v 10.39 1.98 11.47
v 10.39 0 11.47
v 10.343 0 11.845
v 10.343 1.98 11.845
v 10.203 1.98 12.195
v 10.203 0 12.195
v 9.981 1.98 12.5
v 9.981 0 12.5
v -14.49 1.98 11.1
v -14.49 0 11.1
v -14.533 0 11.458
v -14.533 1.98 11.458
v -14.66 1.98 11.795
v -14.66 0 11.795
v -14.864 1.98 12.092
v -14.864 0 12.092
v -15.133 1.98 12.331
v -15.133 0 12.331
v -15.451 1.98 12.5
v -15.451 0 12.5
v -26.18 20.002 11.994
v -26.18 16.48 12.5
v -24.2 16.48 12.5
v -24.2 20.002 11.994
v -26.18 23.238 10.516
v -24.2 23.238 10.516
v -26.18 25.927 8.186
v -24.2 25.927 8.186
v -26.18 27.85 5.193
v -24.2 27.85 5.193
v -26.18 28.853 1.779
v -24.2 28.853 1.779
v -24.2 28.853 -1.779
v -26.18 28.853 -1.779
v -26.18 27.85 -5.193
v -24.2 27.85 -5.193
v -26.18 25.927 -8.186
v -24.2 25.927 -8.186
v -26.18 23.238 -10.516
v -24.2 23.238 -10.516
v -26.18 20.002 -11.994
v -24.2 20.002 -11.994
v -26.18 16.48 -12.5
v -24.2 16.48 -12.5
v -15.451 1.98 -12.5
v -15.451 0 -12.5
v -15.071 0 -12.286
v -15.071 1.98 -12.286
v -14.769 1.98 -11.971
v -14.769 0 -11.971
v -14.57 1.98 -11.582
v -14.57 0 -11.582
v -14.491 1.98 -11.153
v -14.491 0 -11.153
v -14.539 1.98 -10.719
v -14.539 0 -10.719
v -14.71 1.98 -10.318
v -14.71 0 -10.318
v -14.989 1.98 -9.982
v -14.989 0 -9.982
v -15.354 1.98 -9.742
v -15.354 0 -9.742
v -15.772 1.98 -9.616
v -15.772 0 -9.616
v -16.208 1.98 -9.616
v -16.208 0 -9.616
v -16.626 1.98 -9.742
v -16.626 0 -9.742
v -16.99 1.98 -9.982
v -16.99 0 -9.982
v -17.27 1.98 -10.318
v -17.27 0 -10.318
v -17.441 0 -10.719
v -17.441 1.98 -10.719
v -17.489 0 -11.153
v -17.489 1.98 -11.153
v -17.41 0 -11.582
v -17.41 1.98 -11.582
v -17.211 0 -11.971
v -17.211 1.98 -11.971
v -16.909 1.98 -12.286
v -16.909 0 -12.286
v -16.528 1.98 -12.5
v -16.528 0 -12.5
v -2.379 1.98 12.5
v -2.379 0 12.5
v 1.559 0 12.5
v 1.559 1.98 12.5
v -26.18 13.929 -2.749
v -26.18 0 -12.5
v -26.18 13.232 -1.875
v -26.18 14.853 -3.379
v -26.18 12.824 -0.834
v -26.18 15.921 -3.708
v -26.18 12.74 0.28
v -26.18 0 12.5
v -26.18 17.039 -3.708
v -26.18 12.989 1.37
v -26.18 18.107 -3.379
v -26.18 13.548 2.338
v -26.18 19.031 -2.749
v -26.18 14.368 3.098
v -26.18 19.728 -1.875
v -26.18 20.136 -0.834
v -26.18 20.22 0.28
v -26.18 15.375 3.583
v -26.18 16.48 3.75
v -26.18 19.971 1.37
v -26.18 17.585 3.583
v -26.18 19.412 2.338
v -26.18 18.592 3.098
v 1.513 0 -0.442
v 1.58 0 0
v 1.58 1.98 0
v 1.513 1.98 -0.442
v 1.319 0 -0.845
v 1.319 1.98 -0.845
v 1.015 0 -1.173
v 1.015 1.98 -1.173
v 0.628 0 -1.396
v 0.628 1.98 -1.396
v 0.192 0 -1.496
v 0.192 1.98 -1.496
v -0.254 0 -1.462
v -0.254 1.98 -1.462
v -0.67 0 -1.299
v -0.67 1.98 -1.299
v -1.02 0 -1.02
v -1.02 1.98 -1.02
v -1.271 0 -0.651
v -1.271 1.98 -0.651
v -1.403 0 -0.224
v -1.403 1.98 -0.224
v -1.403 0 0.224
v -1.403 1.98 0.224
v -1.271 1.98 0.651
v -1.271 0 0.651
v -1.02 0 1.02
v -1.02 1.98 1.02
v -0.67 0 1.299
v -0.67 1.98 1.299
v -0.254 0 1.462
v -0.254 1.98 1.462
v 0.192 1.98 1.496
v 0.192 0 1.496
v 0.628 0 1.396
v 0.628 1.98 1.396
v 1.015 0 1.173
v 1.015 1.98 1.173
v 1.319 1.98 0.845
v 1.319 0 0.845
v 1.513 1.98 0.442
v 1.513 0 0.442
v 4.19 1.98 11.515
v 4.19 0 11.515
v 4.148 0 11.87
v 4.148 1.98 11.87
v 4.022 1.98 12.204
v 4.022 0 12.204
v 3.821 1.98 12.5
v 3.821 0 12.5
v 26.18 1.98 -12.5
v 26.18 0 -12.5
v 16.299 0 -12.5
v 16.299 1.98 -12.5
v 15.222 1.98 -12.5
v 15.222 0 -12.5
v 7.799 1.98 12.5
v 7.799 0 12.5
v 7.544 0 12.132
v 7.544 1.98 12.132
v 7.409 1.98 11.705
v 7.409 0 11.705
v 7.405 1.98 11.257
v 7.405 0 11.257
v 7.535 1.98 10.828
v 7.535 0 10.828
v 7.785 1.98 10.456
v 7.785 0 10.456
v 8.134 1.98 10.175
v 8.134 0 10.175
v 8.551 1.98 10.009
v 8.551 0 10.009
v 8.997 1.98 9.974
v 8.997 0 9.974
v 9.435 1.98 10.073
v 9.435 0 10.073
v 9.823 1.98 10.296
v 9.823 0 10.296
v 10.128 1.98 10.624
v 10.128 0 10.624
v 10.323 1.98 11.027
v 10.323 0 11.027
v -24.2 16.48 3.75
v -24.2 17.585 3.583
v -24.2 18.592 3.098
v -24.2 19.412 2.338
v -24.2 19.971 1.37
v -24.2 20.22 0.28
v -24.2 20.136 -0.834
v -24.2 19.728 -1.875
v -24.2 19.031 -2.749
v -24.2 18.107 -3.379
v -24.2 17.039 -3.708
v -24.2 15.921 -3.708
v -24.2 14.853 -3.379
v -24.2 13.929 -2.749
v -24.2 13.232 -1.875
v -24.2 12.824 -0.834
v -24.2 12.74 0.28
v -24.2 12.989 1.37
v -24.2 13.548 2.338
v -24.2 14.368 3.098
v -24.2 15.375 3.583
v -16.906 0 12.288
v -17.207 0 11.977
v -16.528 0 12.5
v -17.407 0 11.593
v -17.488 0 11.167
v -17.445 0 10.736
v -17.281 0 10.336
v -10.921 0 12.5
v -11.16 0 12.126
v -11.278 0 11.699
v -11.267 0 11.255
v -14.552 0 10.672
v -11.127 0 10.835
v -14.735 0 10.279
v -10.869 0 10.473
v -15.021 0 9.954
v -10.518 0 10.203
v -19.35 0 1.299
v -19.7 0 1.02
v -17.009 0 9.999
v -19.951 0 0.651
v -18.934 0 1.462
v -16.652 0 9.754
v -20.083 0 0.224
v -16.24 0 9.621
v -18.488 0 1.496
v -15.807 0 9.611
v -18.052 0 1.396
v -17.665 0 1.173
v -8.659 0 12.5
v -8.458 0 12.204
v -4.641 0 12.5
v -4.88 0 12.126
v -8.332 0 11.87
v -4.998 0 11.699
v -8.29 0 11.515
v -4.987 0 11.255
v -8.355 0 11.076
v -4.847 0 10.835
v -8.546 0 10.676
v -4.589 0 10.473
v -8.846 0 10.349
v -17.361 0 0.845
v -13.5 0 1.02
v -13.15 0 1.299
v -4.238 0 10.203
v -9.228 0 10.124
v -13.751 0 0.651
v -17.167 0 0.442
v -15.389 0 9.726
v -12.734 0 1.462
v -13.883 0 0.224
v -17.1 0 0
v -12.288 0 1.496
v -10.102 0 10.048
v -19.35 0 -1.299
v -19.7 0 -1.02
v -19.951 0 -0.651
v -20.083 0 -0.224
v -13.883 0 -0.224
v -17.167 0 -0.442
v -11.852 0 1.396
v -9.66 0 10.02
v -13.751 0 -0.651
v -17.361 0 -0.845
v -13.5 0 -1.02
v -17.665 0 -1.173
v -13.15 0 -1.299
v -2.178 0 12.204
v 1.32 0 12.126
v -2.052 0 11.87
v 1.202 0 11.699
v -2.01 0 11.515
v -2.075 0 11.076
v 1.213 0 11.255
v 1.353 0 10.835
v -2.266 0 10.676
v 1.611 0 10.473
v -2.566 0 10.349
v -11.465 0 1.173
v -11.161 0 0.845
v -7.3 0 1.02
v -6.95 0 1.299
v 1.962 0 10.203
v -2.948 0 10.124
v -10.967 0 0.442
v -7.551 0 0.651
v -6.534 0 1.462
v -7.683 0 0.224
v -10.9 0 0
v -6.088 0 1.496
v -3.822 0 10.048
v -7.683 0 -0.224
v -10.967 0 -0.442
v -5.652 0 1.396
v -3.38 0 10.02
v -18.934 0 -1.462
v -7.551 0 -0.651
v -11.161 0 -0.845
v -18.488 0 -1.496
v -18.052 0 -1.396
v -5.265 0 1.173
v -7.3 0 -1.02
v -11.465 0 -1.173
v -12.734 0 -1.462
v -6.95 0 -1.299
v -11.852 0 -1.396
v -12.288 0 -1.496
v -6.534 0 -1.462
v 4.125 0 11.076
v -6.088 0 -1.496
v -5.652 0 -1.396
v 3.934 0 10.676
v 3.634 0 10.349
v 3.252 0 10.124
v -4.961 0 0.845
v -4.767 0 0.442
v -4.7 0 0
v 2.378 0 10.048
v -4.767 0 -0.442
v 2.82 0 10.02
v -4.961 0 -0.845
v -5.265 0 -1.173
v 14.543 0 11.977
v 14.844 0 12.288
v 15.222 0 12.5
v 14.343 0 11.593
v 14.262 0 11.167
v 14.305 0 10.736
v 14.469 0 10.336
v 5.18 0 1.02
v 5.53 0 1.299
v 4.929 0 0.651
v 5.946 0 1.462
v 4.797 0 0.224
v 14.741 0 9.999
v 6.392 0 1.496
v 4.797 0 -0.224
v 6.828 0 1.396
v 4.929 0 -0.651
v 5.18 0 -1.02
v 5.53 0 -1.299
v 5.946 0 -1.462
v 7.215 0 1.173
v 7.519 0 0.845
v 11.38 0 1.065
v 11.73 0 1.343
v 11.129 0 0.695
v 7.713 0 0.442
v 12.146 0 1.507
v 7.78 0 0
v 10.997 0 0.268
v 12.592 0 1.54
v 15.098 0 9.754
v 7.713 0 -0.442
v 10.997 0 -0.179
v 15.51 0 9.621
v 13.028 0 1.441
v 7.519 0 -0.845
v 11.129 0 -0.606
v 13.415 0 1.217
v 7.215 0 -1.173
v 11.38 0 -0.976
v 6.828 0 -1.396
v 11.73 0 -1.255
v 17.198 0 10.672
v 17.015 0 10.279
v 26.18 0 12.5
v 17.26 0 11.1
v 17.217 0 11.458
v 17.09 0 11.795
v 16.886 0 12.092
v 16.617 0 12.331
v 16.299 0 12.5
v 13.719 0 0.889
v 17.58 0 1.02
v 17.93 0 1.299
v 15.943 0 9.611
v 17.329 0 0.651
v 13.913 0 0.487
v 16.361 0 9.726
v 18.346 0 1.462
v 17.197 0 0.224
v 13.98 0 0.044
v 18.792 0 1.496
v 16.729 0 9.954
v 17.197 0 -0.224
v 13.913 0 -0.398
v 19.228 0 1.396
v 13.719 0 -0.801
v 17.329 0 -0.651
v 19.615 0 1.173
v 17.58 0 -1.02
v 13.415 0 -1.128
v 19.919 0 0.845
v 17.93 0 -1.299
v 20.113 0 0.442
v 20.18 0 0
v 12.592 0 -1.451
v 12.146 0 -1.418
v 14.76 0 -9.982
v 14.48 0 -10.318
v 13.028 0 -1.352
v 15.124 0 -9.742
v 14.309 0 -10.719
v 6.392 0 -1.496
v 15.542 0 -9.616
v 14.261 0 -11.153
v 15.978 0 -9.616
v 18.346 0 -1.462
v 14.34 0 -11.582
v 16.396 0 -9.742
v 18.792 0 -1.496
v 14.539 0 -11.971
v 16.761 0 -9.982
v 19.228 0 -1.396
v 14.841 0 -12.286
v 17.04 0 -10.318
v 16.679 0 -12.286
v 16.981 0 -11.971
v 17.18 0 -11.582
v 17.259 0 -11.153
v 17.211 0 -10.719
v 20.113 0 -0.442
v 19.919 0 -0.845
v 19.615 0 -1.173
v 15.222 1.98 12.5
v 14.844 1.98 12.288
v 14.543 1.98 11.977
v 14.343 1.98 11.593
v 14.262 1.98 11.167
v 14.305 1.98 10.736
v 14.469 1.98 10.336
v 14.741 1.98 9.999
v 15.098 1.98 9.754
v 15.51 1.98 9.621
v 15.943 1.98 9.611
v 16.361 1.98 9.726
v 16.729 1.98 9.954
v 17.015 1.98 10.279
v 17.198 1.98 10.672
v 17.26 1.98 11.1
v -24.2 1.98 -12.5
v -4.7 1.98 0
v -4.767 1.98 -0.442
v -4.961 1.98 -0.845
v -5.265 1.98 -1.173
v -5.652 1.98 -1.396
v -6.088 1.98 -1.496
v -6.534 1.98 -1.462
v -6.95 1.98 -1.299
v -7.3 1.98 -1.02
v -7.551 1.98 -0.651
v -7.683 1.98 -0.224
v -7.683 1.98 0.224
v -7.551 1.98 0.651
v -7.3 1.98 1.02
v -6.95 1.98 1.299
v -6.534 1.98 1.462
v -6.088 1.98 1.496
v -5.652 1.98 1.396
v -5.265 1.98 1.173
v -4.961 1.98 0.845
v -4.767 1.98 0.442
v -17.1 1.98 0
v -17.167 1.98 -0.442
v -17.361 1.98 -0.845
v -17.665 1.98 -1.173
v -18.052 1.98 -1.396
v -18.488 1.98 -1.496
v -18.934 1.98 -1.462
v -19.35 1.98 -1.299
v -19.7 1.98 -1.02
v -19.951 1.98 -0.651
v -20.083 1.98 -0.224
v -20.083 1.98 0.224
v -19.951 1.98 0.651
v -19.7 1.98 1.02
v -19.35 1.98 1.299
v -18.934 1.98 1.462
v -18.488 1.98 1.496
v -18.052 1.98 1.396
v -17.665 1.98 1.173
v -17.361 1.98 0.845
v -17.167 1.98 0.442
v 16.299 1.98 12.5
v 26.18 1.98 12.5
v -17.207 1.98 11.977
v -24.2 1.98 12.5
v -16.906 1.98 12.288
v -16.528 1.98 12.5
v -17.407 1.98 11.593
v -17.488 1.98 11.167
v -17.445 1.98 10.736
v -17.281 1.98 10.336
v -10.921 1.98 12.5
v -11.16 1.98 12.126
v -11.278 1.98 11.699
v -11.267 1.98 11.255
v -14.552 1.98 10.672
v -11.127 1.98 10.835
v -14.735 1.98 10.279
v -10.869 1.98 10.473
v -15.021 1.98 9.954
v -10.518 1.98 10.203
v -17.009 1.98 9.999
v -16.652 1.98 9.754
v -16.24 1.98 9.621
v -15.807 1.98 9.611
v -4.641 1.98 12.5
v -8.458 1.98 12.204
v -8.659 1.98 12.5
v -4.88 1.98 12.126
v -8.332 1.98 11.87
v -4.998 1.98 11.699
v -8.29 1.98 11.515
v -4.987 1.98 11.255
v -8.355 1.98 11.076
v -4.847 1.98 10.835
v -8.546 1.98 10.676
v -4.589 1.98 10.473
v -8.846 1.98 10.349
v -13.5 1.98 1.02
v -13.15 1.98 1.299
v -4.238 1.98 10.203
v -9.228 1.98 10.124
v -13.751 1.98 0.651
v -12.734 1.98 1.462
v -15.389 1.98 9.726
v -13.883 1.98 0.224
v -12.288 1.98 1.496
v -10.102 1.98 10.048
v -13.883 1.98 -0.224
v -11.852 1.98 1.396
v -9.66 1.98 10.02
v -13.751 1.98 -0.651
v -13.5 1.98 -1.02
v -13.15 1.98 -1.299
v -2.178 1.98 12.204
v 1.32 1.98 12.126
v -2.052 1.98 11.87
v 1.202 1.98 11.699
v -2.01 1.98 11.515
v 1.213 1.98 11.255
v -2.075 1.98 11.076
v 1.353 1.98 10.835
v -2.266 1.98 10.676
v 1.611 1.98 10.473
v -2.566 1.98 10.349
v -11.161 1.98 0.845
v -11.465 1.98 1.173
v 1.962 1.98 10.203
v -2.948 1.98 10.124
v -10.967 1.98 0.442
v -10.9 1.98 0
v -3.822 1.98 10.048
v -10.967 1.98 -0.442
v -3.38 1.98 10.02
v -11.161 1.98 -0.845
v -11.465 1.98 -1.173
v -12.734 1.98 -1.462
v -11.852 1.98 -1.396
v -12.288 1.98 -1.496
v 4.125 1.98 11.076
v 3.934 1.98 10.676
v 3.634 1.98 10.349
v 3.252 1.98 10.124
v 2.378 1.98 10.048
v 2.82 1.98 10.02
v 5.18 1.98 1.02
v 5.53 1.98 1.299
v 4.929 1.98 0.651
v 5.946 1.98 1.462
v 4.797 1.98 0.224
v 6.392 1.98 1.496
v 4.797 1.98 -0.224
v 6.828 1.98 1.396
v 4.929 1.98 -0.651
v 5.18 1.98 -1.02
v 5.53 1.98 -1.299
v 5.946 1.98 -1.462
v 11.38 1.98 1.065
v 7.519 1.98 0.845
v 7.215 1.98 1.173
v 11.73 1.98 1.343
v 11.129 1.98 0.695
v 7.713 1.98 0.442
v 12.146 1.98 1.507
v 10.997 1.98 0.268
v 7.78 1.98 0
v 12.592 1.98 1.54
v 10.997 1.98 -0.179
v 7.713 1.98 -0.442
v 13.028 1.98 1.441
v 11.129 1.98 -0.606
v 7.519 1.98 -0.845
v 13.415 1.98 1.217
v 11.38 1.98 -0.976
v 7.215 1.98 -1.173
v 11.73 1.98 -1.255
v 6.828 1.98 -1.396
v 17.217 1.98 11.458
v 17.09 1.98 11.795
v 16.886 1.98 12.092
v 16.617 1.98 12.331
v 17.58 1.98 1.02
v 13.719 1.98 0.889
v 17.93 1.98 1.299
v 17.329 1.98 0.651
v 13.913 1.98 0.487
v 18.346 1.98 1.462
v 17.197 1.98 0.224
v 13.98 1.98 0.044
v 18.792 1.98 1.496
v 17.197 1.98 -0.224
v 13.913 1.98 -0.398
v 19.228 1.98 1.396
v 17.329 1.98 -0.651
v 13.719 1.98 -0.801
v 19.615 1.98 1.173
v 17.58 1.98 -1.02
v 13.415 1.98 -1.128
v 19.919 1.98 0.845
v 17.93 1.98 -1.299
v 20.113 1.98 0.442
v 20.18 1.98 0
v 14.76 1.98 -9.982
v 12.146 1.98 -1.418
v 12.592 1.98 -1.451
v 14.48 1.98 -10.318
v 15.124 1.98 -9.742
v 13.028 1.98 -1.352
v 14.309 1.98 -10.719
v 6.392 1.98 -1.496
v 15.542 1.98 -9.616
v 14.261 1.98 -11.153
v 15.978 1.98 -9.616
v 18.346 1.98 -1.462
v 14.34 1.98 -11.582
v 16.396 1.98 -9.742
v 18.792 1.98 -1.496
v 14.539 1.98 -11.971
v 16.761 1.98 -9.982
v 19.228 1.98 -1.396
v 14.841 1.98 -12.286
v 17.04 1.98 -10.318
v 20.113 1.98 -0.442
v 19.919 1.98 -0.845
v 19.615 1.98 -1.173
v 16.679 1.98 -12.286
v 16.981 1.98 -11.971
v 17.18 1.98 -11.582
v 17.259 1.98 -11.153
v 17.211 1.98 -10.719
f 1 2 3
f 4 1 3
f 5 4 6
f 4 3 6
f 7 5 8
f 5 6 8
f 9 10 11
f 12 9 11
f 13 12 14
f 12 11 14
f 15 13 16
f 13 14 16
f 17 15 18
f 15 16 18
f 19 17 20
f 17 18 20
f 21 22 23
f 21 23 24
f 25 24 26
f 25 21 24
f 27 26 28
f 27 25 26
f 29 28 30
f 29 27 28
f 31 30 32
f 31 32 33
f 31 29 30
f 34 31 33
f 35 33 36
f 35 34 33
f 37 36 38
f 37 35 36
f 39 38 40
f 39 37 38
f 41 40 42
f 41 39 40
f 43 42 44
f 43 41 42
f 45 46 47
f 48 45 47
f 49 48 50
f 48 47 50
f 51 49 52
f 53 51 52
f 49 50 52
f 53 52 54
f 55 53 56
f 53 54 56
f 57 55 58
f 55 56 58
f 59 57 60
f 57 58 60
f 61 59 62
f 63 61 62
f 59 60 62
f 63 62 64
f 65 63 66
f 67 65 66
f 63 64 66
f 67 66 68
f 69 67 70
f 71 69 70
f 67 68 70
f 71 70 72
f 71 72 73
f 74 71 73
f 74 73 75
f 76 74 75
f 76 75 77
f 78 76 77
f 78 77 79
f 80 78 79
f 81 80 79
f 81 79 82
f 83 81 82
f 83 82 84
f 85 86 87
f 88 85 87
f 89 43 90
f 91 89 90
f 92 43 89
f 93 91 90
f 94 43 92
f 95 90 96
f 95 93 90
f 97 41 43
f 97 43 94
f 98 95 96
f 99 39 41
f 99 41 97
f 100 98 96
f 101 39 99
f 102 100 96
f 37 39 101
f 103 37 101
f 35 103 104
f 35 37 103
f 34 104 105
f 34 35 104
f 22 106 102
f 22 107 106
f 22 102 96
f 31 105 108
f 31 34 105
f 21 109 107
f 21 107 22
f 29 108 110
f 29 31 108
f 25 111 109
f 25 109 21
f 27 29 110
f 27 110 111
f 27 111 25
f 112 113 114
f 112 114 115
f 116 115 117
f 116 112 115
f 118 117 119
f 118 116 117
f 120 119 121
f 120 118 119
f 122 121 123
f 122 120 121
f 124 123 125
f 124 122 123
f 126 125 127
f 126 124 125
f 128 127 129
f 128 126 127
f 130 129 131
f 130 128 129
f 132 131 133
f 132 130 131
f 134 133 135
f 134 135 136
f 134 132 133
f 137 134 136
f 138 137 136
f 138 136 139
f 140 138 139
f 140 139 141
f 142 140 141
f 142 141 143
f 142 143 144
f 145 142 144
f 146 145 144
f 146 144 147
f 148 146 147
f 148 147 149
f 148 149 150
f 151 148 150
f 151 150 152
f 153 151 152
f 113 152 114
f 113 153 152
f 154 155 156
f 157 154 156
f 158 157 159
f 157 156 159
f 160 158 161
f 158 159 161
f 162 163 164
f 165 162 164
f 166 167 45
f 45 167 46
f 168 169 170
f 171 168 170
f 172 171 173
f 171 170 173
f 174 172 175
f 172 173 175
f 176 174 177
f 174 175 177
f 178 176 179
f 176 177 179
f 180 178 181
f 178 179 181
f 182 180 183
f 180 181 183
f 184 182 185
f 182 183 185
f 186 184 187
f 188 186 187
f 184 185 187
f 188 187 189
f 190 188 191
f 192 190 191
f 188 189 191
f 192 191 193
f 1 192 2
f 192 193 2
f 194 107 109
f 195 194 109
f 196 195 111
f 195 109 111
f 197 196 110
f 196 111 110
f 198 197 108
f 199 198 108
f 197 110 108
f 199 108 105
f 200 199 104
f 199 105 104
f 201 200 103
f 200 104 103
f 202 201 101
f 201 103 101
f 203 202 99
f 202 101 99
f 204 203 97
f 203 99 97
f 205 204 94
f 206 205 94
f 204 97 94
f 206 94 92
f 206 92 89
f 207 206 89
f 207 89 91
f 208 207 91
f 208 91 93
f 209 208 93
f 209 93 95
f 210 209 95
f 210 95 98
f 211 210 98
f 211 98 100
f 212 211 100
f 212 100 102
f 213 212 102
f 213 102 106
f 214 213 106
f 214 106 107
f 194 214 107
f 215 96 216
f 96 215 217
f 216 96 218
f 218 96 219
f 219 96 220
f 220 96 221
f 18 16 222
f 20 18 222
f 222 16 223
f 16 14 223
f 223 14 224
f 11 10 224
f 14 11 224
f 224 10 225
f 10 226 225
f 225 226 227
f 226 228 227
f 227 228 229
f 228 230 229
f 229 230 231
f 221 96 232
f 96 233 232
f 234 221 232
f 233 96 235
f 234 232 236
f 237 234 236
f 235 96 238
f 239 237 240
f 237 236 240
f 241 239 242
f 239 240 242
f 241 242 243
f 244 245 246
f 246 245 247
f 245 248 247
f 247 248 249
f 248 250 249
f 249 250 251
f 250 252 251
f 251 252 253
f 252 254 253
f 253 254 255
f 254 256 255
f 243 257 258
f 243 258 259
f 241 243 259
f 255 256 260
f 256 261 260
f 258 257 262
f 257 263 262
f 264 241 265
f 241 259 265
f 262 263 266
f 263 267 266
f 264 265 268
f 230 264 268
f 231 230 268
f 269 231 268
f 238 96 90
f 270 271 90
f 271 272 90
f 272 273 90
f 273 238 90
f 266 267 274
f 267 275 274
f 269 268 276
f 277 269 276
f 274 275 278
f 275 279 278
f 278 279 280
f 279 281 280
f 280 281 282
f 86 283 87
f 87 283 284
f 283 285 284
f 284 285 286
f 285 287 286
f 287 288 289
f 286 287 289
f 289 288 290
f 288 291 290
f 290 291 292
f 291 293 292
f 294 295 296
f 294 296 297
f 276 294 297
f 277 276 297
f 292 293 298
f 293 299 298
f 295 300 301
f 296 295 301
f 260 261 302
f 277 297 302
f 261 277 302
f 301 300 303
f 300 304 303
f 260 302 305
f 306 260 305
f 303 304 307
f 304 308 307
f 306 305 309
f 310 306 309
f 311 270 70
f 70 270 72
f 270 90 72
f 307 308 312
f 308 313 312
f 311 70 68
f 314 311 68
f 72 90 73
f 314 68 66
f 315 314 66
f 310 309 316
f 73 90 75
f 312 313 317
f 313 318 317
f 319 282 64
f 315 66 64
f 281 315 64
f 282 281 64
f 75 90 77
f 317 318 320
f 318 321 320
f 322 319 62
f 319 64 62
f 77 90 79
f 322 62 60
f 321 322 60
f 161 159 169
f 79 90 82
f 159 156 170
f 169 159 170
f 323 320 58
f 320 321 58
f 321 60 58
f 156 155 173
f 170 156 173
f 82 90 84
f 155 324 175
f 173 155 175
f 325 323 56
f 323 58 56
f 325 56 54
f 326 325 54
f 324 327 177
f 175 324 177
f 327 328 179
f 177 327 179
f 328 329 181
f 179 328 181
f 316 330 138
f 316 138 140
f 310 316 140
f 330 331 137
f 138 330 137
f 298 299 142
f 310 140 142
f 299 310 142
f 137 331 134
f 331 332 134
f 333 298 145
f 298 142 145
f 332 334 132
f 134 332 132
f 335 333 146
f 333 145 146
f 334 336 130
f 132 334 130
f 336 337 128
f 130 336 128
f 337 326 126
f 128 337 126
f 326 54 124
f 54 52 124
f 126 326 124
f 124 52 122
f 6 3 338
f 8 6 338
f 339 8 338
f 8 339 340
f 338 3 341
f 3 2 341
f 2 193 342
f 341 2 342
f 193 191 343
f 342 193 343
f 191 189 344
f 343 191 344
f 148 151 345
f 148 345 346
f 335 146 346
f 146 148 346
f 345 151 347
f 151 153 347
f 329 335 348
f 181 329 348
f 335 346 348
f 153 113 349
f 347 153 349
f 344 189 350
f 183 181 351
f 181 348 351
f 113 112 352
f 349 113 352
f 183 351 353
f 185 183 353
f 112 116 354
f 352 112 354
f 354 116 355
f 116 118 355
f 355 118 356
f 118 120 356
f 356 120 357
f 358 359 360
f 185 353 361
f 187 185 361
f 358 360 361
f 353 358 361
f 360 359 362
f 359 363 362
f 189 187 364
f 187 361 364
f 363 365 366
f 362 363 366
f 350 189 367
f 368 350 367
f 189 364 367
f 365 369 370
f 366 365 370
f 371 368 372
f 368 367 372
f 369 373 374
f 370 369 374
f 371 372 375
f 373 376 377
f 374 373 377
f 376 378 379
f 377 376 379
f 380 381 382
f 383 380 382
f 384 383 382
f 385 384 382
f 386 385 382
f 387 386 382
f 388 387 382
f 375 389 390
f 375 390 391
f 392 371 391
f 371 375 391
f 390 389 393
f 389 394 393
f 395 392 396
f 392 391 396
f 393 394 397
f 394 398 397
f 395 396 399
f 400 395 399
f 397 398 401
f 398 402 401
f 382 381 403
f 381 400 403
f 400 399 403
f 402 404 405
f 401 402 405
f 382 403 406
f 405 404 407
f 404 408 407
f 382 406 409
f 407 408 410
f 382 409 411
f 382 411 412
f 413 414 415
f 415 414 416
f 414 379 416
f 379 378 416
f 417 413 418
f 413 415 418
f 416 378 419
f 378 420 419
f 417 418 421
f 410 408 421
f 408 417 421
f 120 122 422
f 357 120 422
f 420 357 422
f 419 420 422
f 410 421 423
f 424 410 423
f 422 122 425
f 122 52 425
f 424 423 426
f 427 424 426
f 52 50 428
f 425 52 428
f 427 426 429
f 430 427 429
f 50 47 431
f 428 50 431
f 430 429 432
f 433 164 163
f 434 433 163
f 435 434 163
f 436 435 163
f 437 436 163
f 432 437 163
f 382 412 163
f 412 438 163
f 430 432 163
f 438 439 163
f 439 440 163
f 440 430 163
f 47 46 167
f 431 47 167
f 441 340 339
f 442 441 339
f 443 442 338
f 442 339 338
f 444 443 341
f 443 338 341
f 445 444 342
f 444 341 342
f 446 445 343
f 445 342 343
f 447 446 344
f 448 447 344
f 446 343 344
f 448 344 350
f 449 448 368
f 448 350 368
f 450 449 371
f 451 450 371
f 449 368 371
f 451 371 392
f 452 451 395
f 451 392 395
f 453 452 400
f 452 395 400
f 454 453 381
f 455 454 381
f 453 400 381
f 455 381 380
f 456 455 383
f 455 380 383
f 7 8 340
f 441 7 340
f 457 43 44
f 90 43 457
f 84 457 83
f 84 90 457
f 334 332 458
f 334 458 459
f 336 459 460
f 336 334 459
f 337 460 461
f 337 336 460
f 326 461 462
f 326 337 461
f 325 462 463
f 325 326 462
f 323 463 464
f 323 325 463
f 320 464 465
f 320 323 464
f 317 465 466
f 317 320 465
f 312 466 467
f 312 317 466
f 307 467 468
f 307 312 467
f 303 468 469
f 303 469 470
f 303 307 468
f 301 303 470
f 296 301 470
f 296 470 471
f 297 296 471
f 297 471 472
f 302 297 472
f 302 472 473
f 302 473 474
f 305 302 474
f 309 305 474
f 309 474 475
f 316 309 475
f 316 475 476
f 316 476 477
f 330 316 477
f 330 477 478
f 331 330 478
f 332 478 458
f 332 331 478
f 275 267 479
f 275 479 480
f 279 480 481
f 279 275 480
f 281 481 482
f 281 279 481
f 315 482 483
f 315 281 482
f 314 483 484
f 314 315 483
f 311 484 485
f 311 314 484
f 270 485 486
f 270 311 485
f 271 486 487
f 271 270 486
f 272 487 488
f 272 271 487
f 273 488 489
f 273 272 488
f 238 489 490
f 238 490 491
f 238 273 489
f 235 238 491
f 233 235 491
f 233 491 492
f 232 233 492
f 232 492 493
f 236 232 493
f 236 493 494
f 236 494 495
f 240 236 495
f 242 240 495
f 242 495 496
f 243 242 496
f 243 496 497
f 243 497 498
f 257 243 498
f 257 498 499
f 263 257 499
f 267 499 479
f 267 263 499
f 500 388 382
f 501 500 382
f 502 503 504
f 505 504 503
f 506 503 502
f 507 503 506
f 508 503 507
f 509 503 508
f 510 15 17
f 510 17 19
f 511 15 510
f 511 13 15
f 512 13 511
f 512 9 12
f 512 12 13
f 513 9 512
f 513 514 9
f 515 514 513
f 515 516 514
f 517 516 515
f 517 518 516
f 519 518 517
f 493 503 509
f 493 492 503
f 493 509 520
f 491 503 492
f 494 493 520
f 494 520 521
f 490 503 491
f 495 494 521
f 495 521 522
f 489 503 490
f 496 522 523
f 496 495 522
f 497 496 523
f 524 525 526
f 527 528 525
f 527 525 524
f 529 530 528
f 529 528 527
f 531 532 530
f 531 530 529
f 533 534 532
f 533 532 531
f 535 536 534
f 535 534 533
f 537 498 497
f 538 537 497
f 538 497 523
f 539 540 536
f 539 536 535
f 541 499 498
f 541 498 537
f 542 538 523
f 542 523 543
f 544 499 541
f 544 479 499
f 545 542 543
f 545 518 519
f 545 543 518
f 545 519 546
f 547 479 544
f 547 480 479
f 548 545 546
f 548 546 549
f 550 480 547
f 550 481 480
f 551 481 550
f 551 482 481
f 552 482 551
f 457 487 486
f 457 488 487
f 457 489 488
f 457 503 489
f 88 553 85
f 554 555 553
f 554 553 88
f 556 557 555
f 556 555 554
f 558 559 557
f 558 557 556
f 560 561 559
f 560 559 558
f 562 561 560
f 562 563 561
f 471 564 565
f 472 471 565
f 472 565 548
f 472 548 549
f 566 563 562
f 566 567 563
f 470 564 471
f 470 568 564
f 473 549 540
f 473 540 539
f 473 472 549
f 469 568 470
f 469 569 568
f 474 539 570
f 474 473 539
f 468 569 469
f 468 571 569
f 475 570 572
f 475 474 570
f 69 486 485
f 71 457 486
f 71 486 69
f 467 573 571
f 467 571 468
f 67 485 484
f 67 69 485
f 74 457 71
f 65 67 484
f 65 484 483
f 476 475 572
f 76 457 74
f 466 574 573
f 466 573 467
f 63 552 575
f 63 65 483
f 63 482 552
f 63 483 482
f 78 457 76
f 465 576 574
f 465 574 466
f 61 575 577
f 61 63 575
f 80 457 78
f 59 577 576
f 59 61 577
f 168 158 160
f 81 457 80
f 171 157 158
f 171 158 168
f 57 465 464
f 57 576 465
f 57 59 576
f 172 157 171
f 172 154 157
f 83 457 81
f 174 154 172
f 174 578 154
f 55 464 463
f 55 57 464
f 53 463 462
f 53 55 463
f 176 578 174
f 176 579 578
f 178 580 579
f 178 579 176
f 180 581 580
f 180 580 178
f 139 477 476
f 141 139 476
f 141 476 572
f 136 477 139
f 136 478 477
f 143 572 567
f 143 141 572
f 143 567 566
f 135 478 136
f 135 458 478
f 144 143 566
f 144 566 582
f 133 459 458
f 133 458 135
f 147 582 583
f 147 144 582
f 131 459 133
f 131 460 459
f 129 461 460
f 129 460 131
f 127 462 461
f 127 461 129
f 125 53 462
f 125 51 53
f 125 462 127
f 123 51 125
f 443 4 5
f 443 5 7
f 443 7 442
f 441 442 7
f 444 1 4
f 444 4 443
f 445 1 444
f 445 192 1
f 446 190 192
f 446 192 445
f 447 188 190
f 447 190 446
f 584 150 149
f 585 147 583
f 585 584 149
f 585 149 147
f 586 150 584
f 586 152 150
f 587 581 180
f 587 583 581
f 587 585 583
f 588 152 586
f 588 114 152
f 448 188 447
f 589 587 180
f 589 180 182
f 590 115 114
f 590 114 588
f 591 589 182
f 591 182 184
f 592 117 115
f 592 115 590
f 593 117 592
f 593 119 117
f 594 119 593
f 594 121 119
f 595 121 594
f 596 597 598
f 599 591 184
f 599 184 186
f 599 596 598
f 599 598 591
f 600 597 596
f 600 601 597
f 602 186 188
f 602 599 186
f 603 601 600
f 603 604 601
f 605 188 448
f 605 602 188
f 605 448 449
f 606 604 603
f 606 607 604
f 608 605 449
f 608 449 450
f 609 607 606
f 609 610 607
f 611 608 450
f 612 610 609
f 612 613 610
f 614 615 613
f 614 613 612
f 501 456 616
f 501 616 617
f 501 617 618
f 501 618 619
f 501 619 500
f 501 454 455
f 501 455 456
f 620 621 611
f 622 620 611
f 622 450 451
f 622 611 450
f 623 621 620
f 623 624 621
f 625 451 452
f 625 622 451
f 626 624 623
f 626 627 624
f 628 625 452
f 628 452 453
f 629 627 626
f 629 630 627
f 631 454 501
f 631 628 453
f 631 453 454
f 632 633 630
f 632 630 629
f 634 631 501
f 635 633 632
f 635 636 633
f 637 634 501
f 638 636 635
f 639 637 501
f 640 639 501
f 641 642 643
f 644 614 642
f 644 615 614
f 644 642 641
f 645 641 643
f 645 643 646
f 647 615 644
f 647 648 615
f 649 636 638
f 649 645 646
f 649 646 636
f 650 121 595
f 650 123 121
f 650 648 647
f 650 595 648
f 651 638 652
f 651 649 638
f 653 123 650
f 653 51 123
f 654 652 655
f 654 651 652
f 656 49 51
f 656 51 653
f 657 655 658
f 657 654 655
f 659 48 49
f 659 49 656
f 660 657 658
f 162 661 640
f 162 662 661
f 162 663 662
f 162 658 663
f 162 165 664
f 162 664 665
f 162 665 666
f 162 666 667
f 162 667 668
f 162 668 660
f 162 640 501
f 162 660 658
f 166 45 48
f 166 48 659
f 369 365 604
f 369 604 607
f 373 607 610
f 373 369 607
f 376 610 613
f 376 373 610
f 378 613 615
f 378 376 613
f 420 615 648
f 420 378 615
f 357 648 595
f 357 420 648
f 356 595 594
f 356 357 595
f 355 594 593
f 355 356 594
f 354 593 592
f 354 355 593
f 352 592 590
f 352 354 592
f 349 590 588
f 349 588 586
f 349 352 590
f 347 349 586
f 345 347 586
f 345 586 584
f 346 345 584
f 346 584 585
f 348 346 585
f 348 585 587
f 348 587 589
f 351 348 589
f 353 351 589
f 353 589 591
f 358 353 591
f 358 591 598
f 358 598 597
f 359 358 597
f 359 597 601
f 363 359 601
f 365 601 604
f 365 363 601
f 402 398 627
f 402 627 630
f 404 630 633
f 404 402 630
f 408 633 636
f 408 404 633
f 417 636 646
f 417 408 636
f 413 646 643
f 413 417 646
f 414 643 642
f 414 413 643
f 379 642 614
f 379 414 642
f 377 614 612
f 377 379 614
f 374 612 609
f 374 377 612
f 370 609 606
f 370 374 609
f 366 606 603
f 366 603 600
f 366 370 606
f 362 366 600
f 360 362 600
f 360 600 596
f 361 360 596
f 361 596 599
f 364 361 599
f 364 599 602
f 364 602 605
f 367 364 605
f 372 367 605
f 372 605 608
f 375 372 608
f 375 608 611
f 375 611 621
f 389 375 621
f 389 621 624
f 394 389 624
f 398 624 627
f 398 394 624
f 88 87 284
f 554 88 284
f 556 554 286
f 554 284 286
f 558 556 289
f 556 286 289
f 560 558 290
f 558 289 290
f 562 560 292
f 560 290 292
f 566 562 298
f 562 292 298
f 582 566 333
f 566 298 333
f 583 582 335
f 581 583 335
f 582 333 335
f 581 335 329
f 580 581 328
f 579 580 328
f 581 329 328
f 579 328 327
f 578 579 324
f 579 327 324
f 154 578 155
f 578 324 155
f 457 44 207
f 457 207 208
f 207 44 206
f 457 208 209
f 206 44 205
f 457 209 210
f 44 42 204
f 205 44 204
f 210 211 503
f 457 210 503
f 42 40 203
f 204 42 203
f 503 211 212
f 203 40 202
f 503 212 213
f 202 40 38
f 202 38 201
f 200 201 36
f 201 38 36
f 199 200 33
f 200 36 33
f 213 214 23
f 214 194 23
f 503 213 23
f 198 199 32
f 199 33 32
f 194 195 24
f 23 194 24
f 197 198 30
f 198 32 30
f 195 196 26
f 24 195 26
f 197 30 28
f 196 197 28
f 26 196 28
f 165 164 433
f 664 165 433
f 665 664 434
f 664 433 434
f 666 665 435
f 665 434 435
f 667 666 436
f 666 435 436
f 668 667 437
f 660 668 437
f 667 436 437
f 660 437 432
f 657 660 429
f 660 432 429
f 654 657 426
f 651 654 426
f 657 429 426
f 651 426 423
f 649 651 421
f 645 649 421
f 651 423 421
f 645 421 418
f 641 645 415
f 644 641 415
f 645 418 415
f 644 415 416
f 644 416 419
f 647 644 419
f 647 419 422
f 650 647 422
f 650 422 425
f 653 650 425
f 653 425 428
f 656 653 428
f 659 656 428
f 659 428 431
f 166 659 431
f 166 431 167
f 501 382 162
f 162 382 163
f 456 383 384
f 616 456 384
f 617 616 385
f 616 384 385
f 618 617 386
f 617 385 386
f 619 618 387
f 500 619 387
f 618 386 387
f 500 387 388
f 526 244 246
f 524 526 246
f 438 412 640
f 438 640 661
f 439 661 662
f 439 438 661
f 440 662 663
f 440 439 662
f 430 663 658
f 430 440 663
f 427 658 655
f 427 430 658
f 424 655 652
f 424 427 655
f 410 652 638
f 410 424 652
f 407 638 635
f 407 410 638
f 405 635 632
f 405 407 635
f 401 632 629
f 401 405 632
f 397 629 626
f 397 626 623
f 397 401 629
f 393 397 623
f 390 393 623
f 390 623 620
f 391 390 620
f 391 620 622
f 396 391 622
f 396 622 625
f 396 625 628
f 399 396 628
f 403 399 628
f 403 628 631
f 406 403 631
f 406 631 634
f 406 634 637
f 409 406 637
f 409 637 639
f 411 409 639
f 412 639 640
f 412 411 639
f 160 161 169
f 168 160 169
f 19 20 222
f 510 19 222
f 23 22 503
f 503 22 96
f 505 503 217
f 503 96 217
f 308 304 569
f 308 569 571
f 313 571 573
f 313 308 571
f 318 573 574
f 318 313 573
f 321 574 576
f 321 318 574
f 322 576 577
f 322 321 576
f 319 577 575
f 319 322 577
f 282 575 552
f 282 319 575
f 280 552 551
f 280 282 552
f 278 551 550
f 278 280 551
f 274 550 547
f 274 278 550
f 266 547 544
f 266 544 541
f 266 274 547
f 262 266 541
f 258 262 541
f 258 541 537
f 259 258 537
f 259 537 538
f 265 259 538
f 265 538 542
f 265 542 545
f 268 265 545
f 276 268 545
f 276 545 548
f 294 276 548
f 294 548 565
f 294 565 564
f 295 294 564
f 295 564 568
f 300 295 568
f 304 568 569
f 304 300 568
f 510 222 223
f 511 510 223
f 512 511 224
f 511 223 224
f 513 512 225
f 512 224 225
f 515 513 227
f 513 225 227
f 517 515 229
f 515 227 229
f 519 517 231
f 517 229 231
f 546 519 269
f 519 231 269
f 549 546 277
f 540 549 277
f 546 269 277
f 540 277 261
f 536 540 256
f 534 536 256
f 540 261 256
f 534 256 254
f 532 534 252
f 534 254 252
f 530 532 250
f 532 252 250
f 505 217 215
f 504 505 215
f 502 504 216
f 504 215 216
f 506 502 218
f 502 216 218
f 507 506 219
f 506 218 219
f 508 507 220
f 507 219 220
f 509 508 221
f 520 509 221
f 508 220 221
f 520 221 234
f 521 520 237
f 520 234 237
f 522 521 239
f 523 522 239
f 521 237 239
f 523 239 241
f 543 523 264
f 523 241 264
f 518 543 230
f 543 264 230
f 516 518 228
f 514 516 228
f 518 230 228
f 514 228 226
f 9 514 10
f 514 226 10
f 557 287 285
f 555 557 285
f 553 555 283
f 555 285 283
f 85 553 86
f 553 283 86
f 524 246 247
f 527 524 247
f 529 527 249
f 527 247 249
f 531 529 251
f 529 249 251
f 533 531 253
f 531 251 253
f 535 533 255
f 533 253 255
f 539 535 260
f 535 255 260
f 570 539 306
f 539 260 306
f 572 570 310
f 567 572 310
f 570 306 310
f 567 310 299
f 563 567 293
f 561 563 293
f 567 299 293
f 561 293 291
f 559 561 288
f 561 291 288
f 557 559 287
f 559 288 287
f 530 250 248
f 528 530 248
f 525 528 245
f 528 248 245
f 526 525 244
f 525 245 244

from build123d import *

# Parameters (mm, degrees)
SKETCH1_R           = 1.5
BOSS_EXTRUDE1_DEPTH = 1.98
SKETCH2_W           = 1.98
SKETCH2_H           = 25
BOSS_EXTRUDE2_DEPTH = 14.5
SKETCH3_R           = 12.5
BOSS_EXTRUDE5_DEPTH = 1.98
SKETCH4_R           = 3.75
CUT_EXTRUDE1_DEPTH  = 14.5


with BuildPart() as part:
    # Sketch1 → Boss-Extrude1 (new body)
    with BuildSketch(Plane(origin=(0, 0, 0), x_dir=(1, 0, 0), z_dir=(0, 1, 0))):
        with BuildLine():
            Line((16.298685972, -12.5), (26.18, -12.5))
            Line((26.18, -12.5), (26.18, 12.5))
            Line((26.18, 12.5), (16.298685972, 12.5))
            ThreePointArc((16.298685972, 12.5), (15.760169492, 9.6), (15.221653011, 12.5))
            Line((15.221653011, 12.5), (-15.451314028, 12.5))
            ThreePointArc((-15.451314028, 12.5), (-15.989830508, 9.6), (-16.528346989, 12.5))
            Line((-16.528346989, 12.5), (-26.18, 12.5))
            Line((-26.18, 12.5), (-26.18, -12.5))
            Line((-26.18, -12.5), (-16.528346989, -12.5))
            ThreePointArc((-16.528346989, -12.5), (-16.839014022, -9.863518152), (-14.489830508, -11.1))
            ThreePointArc((-14.489830508, -11.1), (-14.75334866, -11.949183513), (-15.451314028, -12.5))
            Line((-15.451314028, -12.5), (-10.920895266, -12.5))
            ThreePointArc((-10.920895266, -12.5), (-10.315854683, -10.110021252), (-8.289830508, -11.514762712))
            ThreePointArc((-8.289830508, -11.514762712), (-8.385089049, -12.040786886), (-8.658765751, -12.5))
            Line((-8.658765751, -12.5), (-4.640895266, -12.5))
            ThreePointArc((-4.640895266, -12.5), (-4.035854683, -10.110021252), (-2.009830508, -11.514762712))
            ThreePointArc((-2.009830508, -11.514762712), (-2.105089049, -12.040786886), (-2.378765751, -12.5))
            Line((-2.378765751, -12.5), (1.559104734, -12.5))
            ThreePointArc((1.559104734, -12.5), (2.164145317, -10.110021252), (4.190169492, -11.514762712))
            ThreePointArc((4.190169492, -11.514762712), (4.094910951, -12.040786886), (3.821234249, -12.5))
            Line((3.821234249, -12.5), (7.799342787, -12.5))
            ThreePointArc((7.799342787, -12.5), (8.336202009, -10.076431428), (10.390169492, -11.470389831))
            ThreePointArc((10.390169492, -11.470389831), (10.284127894, -12.024357313), (9.980996196, -12.5))
            Line((9.980996196, -12.5), (15.221653011, -12.5))
            ThreePointArc((15.221653011, -12.5), (14.910985978, -9.863518152), (17.260169492, -11.1))
            ThreePointArc((17.260169492, -11.1), (16.99665134, -11.949183513), (16.298685972, -12.5))
        make_face()
        with Locations((-18.6, 0)):
            Circle(SKETCH1_R, mode=Mode.SUBTRACT)
        with Locations((-12.4, 0)):
            Circle(SKETCH1_R, mode=Mode.SUBTRACT)
        with Locations((-6.2, 0)):
            Circle(SKETCH1_R, mode=Mode.SUBTRACT)
        with Locations((0.08, 0)):
            Circle(SKETCH1_R, mode=Mode.SUBTRACT)
        with Locations((6.28, 0)):
            Circle(SKETCH1_R, mode=Mode.SUBTRACT)
        with Locations((12.48, -0.044372881)):
            Circle(SKETCH1_R, mode=Mode.SUBTRACT)
        with Locations((18.68, 0)):
            Circle(SKETCH1_R, mode=Mode.SUBTRACT)
    extrude(amount=BOSS_EXTRUDE1_DEPTH)

    # Sketch2 → Boss-Extrude2 (add)
    with BuildSketch(Plane(origin=(0, 1.98, 0), x_dir=(1, 0, 0), z_dir=(0, 1, 0))):
        with Locations((-25.19, 0)):
            Rectangle(SKETCH2_W, SKETCH2_H)
    extrude(amount=BOSS_EXTRUDE2_DEPTH)

    # Sketch3 → Boss-Extrude5 (add)
    with BuildSketch(Plane.ZY.offset(26.18)):
        with Locations((0, 16.48)):
            Circle(SKETCH3_R)
    extrude(amount=-BOSS_EXTRUDE5_DEPTH)

    # Sketch4 → Cut-Extrude1 (cut)
    with BuildSketch(Plane.ZY.offset(26.18)):
        with Locations((0, 16.48)):
            Circle(SKETCH4_R)
    extrude(amount=-CUT_EXTRUDE1_DEPTH, mode=Mode.SUBTRACT)


solid = part.part
